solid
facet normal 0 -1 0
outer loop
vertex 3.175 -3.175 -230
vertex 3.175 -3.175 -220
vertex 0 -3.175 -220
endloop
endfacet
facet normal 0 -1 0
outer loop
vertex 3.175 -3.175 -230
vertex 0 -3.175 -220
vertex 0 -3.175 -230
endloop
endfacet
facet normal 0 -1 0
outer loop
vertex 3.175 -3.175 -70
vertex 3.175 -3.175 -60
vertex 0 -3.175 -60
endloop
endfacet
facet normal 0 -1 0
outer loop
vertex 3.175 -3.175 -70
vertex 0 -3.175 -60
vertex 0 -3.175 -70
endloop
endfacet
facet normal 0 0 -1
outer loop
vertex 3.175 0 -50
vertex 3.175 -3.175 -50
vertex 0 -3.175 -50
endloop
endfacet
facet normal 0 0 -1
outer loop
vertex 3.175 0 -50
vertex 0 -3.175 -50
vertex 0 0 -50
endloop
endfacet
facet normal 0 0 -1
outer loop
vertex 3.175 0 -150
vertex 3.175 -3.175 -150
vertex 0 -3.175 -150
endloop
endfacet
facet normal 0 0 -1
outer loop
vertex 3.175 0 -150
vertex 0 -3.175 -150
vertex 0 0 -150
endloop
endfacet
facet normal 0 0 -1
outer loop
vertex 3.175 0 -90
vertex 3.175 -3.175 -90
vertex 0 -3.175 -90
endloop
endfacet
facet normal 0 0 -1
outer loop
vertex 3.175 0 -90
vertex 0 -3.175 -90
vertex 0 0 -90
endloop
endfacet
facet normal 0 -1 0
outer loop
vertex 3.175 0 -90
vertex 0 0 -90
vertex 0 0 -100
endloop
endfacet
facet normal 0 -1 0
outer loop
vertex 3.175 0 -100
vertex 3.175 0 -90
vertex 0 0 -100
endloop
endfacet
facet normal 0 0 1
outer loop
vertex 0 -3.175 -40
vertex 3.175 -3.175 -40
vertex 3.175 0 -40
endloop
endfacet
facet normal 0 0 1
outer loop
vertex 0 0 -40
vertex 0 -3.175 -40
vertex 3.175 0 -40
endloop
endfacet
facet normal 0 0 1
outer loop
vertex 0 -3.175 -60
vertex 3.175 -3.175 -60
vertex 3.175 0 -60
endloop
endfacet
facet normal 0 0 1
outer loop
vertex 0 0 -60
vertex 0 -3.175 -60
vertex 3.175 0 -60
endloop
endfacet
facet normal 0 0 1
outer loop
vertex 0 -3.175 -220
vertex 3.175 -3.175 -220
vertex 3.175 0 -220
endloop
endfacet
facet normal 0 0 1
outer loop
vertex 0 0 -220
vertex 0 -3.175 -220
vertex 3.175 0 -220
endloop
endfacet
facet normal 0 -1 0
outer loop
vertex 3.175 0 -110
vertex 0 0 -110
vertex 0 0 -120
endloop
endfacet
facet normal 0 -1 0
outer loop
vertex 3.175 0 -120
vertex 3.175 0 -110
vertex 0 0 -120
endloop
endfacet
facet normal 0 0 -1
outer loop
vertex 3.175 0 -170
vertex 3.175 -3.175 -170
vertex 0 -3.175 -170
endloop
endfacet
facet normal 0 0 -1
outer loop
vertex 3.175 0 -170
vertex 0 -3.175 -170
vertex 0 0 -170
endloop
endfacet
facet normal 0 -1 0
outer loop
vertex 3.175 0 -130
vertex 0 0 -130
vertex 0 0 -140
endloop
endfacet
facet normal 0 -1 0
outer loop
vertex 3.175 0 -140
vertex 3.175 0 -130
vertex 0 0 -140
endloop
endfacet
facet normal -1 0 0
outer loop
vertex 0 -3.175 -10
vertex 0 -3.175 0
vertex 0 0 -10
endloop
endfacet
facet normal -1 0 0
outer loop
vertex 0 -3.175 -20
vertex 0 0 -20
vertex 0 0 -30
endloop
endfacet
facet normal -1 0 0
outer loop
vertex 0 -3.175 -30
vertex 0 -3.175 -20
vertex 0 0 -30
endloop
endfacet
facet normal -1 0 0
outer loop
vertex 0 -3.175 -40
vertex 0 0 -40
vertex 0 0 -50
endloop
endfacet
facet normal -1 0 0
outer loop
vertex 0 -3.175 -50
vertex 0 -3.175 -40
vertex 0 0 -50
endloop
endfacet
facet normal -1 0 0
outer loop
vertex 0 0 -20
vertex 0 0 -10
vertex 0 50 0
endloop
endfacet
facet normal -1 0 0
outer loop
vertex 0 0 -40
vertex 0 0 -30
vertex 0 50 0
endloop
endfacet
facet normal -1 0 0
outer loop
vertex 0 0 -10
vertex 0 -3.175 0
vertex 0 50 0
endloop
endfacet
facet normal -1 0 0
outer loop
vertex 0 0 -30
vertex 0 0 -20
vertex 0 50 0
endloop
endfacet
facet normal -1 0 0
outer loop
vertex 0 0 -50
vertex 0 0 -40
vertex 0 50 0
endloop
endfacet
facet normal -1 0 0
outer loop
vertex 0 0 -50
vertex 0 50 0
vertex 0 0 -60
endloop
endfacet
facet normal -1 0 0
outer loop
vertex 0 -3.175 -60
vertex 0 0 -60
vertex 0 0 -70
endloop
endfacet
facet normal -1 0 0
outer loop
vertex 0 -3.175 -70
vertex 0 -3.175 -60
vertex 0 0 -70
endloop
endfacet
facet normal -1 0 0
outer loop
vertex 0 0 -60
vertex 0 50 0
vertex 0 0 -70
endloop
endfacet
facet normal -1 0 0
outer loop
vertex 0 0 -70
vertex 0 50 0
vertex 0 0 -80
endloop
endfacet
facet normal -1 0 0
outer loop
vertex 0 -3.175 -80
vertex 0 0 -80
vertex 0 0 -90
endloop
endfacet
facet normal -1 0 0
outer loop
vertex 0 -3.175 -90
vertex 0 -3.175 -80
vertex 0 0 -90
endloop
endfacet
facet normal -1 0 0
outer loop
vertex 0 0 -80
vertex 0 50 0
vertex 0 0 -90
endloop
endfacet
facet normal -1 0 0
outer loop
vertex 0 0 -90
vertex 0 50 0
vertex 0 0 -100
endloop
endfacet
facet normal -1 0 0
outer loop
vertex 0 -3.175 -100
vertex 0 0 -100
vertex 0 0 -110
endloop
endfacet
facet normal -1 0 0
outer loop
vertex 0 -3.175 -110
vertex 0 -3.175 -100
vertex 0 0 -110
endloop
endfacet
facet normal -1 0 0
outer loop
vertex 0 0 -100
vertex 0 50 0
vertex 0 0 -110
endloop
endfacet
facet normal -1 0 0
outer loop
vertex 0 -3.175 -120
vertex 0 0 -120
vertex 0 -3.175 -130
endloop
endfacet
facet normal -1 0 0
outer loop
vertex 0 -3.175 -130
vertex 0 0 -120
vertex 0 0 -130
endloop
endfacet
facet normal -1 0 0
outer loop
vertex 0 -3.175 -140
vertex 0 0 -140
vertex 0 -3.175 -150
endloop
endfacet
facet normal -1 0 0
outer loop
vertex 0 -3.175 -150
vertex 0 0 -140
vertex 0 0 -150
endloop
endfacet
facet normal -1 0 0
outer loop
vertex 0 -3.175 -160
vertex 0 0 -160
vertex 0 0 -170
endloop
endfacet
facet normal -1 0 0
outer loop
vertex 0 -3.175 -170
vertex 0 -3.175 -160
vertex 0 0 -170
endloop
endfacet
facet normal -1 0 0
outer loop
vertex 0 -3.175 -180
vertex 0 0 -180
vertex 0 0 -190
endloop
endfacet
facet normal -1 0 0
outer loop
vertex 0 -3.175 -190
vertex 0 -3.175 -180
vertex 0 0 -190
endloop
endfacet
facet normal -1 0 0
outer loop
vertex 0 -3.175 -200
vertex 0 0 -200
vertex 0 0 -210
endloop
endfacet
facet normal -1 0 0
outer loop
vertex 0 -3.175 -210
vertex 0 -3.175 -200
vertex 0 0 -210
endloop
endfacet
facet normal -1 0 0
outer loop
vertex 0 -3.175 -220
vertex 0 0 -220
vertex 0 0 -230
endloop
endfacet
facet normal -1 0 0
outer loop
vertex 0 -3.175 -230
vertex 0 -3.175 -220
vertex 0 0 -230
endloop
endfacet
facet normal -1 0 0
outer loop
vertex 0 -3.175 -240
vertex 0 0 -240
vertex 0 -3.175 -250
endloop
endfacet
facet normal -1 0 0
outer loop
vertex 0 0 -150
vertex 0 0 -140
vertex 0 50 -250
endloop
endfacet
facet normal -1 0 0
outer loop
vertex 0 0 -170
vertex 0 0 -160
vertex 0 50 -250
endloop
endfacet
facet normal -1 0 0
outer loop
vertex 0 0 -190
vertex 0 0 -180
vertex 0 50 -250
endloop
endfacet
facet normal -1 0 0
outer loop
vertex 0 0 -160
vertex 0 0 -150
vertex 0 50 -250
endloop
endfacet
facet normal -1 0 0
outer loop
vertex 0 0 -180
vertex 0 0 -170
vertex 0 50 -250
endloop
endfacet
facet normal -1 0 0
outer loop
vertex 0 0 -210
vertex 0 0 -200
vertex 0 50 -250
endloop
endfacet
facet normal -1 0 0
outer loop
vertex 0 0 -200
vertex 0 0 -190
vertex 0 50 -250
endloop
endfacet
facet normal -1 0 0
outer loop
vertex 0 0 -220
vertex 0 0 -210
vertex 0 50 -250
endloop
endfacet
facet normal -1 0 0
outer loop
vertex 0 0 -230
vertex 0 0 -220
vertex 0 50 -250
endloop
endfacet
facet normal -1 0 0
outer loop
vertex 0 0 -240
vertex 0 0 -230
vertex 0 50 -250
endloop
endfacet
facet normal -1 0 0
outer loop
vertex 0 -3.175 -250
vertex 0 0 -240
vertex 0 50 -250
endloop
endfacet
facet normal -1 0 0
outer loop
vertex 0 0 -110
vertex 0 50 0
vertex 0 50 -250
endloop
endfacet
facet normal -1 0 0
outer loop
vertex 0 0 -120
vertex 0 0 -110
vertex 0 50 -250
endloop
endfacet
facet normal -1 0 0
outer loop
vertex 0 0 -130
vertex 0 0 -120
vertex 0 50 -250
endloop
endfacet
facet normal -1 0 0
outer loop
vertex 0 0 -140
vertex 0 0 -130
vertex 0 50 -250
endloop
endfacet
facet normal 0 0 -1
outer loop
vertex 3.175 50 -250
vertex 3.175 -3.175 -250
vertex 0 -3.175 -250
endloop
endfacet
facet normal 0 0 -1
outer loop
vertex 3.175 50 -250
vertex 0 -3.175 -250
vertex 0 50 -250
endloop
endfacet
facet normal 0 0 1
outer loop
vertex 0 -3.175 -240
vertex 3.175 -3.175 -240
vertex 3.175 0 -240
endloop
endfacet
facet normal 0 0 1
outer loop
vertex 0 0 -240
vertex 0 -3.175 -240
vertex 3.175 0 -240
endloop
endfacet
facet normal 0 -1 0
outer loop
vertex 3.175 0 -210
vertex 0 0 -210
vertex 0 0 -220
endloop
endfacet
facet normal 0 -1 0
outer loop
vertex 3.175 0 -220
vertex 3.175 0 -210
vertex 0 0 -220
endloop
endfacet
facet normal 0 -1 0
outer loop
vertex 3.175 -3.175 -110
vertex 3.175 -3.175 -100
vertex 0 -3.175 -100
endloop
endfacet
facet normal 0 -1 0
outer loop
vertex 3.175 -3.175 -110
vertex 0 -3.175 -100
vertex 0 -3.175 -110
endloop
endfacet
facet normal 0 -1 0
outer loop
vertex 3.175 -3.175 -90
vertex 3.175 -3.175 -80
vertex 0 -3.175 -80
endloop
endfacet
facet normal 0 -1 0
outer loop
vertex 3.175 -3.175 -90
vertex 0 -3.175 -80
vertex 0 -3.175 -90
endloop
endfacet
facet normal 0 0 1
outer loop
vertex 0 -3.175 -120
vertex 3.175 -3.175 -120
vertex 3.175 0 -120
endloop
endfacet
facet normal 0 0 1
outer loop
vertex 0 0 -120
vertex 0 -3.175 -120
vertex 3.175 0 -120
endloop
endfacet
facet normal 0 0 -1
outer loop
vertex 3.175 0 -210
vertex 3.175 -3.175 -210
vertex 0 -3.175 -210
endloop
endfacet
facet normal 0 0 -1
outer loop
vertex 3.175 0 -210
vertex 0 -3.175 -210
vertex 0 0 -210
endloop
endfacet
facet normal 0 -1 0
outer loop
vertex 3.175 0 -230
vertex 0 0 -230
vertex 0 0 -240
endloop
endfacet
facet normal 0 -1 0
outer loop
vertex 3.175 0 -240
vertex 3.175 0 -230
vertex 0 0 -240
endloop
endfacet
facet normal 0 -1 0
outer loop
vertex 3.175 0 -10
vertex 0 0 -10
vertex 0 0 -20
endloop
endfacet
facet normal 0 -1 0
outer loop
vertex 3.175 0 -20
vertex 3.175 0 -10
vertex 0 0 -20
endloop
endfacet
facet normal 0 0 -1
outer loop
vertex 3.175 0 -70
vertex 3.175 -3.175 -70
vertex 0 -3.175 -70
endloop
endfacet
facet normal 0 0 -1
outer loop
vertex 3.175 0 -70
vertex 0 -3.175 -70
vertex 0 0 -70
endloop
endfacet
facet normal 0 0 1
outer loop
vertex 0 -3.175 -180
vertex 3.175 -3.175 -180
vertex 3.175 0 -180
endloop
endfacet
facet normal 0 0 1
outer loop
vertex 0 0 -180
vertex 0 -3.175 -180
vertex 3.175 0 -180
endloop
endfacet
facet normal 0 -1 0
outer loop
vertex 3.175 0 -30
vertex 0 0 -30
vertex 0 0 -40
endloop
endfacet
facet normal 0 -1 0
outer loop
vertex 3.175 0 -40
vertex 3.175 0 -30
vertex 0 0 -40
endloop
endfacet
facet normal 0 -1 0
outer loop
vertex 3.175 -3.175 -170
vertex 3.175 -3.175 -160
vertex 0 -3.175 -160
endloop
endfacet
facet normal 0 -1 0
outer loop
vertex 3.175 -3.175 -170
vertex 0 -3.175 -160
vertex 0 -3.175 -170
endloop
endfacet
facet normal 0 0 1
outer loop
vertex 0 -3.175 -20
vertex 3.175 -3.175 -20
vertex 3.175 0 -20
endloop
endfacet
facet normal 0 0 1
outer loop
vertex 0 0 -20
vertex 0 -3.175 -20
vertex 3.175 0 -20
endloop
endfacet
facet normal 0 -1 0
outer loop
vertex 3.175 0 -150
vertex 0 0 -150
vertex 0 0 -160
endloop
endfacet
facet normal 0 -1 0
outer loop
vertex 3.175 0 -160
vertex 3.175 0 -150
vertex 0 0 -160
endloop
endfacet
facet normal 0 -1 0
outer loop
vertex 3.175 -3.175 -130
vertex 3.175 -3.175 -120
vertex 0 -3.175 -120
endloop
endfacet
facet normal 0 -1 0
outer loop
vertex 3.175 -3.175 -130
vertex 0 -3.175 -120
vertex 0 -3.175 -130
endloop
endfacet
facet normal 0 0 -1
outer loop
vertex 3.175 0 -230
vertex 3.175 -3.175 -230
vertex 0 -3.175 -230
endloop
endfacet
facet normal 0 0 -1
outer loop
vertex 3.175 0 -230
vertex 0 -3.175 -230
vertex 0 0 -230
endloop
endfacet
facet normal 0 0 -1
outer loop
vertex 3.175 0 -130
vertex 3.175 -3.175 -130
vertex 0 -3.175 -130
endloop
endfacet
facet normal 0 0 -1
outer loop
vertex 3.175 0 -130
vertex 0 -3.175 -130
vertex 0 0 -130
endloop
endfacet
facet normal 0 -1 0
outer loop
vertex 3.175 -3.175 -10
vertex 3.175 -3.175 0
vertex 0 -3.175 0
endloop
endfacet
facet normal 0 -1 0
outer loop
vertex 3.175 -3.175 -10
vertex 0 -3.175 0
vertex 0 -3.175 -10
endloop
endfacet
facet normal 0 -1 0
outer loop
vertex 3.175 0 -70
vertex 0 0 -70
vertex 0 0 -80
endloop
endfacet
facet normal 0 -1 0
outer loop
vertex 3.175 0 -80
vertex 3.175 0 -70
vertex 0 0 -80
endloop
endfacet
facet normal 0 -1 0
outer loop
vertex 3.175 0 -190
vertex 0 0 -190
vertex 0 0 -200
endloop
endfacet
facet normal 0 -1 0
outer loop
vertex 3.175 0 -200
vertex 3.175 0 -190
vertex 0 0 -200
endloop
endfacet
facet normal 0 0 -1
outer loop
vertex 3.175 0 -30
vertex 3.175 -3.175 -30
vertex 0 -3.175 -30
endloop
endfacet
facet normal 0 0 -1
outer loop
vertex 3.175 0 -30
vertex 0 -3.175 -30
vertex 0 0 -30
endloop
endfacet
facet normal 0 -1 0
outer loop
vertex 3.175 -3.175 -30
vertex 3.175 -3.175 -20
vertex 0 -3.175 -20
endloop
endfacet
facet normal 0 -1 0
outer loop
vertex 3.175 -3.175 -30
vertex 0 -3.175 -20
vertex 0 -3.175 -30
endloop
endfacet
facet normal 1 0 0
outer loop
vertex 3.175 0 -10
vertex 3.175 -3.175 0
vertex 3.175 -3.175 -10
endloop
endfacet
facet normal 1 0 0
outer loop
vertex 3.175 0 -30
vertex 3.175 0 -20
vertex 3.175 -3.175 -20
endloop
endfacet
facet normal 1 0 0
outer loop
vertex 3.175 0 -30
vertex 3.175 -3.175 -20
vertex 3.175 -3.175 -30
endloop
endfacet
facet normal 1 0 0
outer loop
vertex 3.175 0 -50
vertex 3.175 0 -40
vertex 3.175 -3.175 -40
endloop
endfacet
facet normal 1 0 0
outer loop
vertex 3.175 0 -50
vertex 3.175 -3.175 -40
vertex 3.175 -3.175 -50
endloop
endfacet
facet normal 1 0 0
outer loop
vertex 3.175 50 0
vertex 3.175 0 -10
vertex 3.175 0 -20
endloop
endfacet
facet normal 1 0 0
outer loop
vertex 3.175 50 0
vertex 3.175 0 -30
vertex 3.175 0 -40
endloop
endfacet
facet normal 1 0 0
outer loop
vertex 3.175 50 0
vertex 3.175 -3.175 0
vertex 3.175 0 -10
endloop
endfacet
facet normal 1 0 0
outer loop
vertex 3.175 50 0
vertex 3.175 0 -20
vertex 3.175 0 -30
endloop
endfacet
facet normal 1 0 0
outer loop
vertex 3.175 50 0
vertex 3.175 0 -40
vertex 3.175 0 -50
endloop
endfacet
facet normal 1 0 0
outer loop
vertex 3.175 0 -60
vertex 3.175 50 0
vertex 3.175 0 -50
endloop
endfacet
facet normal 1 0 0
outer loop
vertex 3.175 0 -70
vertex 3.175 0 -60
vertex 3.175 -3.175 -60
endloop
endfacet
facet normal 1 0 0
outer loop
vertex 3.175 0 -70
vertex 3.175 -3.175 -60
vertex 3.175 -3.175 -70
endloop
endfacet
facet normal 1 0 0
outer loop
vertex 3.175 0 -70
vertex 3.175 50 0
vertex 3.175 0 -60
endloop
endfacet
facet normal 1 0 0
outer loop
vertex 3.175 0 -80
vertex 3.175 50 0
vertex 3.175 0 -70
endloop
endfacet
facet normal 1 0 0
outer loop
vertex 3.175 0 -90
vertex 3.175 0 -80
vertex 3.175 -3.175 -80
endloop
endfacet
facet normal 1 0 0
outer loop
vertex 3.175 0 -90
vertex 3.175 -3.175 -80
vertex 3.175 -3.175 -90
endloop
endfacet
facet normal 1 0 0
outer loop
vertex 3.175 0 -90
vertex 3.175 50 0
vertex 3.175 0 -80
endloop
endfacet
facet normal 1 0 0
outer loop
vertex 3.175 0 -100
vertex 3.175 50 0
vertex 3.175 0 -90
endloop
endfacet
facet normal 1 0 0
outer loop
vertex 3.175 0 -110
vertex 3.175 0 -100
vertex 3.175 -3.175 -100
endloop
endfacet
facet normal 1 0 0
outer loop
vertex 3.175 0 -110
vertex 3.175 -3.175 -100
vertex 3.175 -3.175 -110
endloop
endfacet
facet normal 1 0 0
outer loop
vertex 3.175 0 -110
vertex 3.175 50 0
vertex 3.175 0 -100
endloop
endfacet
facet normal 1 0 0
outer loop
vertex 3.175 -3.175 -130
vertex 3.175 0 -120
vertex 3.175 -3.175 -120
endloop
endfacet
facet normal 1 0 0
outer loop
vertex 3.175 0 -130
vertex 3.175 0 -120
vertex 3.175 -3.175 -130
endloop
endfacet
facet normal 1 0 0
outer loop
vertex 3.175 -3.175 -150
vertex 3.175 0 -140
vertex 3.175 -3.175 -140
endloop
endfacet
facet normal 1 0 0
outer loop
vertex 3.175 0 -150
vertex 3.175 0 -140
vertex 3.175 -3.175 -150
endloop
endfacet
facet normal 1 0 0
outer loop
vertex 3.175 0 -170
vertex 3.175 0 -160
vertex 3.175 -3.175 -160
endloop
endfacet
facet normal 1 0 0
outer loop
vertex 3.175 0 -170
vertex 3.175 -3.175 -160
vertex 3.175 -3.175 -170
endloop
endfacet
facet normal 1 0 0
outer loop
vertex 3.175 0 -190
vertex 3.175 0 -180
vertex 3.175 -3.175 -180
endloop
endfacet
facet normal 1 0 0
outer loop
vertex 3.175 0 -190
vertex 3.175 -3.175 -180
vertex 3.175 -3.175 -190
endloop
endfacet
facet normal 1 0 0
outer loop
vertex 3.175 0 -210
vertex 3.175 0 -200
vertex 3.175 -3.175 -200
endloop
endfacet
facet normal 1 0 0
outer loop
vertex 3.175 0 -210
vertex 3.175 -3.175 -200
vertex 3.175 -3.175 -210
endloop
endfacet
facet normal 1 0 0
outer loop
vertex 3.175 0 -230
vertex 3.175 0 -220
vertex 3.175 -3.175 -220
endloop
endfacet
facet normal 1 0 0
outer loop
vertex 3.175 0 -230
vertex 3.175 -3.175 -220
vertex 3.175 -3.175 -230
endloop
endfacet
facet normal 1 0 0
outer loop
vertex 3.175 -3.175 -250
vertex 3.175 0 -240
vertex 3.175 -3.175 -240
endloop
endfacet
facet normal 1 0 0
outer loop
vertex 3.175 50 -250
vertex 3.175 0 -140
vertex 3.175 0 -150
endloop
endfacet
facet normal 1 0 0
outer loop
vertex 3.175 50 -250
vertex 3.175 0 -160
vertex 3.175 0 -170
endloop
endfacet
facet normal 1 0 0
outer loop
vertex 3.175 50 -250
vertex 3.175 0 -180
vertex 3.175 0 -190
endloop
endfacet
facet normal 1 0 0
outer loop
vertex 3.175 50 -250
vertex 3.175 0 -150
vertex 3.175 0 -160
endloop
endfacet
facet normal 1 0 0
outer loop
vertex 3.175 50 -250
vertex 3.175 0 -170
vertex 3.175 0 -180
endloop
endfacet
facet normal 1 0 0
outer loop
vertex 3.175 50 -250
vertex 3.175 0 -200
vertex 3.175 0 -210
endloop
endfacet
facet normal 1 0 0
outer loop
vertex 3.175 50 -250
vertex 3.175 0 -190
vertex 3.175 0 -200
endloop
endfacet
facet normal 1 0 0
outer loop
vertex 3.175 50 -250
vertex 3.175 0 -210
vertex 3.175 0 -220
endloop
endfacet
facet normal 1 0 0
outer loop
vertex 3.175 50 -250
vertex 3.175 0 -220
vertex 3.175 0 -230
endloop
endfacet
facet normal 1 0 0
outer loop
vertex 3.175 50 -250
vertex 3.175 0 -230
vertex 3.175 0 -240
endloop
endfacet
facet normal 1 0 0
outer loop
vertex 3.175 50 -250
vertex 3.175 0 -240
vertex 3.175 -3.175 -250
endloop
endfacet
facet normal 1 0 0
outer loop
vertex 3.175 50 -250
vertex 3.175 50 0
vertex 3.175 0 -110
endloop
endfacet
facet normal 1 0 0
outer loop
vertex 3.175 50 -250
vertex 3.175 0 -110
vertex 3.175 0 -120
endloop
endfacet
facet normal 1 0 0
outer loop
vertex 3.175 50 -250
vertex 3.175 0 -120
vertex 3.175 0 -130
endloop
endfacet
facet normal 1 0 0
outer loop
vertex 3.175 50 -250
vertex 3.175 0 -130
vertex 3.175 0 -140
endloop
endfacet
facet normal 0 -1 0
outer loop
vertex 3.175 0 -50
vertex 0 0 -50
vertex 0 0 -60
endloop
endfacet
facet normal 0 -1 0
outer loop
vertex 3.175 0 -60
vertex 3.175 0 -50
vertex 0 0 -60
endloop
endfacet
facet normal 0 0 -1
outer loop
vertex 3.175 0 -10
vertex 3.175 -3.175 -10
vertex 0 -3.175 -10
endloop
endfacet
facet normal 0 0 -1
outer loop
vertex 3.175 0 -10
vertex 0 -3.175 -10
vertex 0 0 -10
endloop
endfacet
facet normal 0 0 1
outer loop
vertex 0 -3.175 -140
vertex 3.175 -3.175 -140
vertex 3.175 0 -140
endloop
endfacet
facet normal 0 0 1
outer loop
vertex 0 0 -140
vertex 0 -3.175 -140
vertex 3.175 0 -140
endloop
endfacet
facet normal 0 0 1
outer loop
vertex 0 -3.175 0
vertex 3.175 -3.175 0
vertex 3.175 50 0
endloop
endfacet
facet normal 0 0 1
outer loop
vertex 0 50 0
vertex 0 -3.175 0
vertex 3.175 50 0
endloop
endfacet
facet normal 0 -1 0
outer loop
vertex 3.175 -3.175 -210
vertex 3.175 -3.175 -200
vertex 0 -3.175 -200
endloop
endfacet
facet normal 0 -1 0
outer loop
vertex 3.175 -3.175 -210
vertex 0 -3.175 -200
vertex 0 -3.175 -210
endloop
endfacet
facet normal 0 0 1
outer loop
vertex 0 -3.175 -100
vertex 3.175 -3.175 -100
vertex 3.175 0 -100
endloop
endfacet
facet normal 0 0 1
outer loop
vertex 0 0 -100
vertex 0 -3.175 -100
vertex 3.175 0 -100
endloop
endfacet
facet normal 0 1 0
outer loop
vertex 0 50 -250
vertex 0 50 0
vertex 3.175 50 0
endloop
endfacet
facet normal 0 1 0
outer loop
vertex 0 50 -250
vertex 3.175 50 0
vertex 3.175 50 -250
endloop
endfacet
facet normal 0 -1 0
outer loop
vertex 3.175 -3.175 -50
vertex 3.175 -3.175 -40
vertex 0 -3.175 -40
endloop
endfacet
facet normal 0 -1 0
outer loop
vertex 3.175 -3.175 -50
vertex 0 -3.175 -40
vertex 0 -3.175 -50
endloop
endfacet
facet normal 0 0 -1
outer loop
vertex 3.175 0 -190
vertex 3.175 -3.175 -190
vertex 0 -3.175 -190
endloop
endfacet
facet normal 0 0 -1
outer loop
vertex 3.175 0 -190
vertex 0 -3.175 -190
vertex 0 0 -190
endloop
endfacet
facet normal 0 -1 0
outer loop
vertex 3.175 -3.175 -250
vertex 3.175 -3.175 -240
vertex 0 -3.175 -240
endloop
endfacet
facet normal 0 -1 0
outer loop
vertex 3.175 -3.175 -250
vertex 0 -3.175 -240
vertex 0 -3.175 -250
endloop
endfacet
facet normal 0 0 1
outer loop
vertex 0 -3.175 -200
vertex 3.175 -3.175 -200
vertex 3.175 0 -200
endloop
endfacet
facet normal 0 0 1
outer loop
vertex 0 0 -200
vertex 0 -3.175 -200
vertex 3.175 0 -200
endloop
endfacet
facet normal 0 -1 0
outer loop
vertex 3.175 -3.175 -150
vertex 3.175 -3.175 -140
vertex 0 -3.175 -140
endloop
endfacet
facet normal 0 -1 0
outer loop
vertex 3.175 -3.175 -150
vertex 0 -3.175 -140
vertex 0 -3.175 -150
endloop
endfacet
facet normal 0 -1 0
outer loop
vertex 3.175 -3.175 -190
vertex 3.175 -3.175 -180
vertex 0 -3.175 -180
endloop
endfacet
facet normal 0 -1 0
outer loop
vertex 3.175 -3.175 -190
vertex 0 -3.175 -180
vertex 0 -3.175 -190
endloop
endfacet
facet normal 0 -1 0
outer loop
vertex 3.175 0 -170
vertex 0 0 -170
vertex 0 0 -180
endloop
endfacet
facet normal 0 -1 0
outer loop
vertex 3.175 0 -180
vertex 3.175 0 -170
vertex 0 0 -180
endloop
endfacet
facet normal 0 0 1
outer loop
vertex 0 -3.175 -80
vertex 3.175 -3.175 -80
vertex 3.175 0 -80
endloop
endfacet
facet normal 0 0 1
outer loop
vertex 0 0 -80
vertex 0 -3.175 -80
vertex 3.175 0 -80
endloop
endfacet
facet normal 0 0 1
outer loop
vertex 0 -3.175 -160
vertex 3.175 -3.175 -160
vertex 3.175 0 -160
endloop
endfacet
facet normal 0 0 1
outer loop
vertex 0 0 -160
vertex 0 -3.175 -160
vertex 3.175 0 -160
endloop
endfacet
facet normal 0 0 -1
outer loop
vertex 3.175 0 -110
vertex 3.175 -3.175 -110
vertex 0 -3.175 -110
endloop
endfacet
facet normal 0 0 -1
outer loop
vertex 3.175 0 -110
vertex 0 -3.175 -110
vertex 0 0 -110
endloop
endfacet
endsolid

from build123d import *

# Parameters (mm, degrees)
ESQUISSE2_W                = 250
ESQUISSE2_H                = 50
BOSS_EXTRU_1_DEPTH         = 3.175
ESQUISSE3_W                = 10
ESQUISSE3_H                = 3.175
BOSS_EXTRU_2_DEPTH         = 3.175
R_P_TITION_LIN_AIRE1_COUNT = 13
R_P_TITION_LIN_AIRE1_PITCH = 20


with BuildPart() as part:
    # Esquisse2 → Boss.-Extru.1 (new body)
    with BuildSketch(Plane(origin=(0, 0, 0), x_dir=(0, 0, -1), z_dir=(1, 0, 0))):
        with Locations((125, 25)):
            Rectangle(ESQUISSE2_W, ESQUISSE2_H)
    extrude(amount=BOSS_EXTRU_1_DEPTH)

    # Esquisse3 → Boss.-Extru.2 (add)
    with BuildSketch(Plane(origin=(3.175, 0, 0), x_dir=(0, 0, -1), z_dir=(1, 0, 0))):
        with Locations((5, -1.5875)):
            Rectangle(ESQUISSE3_W, ESQUISSE3_H)
    boss_extru_2 = extrude(amount=-BOSS_EXTRU_2_DEPTH)

    # Répétition linéaire1: Boss.-Extru.2 ×13
    with Locations(*[(0, 0, -i * R_P_TITION_LIN_AIRE1_PITCH) for i in range(1, R_P_TITION_LIN_AIRE1_COUNT)]):
        add(boss_extru_2)


solid = part.part
